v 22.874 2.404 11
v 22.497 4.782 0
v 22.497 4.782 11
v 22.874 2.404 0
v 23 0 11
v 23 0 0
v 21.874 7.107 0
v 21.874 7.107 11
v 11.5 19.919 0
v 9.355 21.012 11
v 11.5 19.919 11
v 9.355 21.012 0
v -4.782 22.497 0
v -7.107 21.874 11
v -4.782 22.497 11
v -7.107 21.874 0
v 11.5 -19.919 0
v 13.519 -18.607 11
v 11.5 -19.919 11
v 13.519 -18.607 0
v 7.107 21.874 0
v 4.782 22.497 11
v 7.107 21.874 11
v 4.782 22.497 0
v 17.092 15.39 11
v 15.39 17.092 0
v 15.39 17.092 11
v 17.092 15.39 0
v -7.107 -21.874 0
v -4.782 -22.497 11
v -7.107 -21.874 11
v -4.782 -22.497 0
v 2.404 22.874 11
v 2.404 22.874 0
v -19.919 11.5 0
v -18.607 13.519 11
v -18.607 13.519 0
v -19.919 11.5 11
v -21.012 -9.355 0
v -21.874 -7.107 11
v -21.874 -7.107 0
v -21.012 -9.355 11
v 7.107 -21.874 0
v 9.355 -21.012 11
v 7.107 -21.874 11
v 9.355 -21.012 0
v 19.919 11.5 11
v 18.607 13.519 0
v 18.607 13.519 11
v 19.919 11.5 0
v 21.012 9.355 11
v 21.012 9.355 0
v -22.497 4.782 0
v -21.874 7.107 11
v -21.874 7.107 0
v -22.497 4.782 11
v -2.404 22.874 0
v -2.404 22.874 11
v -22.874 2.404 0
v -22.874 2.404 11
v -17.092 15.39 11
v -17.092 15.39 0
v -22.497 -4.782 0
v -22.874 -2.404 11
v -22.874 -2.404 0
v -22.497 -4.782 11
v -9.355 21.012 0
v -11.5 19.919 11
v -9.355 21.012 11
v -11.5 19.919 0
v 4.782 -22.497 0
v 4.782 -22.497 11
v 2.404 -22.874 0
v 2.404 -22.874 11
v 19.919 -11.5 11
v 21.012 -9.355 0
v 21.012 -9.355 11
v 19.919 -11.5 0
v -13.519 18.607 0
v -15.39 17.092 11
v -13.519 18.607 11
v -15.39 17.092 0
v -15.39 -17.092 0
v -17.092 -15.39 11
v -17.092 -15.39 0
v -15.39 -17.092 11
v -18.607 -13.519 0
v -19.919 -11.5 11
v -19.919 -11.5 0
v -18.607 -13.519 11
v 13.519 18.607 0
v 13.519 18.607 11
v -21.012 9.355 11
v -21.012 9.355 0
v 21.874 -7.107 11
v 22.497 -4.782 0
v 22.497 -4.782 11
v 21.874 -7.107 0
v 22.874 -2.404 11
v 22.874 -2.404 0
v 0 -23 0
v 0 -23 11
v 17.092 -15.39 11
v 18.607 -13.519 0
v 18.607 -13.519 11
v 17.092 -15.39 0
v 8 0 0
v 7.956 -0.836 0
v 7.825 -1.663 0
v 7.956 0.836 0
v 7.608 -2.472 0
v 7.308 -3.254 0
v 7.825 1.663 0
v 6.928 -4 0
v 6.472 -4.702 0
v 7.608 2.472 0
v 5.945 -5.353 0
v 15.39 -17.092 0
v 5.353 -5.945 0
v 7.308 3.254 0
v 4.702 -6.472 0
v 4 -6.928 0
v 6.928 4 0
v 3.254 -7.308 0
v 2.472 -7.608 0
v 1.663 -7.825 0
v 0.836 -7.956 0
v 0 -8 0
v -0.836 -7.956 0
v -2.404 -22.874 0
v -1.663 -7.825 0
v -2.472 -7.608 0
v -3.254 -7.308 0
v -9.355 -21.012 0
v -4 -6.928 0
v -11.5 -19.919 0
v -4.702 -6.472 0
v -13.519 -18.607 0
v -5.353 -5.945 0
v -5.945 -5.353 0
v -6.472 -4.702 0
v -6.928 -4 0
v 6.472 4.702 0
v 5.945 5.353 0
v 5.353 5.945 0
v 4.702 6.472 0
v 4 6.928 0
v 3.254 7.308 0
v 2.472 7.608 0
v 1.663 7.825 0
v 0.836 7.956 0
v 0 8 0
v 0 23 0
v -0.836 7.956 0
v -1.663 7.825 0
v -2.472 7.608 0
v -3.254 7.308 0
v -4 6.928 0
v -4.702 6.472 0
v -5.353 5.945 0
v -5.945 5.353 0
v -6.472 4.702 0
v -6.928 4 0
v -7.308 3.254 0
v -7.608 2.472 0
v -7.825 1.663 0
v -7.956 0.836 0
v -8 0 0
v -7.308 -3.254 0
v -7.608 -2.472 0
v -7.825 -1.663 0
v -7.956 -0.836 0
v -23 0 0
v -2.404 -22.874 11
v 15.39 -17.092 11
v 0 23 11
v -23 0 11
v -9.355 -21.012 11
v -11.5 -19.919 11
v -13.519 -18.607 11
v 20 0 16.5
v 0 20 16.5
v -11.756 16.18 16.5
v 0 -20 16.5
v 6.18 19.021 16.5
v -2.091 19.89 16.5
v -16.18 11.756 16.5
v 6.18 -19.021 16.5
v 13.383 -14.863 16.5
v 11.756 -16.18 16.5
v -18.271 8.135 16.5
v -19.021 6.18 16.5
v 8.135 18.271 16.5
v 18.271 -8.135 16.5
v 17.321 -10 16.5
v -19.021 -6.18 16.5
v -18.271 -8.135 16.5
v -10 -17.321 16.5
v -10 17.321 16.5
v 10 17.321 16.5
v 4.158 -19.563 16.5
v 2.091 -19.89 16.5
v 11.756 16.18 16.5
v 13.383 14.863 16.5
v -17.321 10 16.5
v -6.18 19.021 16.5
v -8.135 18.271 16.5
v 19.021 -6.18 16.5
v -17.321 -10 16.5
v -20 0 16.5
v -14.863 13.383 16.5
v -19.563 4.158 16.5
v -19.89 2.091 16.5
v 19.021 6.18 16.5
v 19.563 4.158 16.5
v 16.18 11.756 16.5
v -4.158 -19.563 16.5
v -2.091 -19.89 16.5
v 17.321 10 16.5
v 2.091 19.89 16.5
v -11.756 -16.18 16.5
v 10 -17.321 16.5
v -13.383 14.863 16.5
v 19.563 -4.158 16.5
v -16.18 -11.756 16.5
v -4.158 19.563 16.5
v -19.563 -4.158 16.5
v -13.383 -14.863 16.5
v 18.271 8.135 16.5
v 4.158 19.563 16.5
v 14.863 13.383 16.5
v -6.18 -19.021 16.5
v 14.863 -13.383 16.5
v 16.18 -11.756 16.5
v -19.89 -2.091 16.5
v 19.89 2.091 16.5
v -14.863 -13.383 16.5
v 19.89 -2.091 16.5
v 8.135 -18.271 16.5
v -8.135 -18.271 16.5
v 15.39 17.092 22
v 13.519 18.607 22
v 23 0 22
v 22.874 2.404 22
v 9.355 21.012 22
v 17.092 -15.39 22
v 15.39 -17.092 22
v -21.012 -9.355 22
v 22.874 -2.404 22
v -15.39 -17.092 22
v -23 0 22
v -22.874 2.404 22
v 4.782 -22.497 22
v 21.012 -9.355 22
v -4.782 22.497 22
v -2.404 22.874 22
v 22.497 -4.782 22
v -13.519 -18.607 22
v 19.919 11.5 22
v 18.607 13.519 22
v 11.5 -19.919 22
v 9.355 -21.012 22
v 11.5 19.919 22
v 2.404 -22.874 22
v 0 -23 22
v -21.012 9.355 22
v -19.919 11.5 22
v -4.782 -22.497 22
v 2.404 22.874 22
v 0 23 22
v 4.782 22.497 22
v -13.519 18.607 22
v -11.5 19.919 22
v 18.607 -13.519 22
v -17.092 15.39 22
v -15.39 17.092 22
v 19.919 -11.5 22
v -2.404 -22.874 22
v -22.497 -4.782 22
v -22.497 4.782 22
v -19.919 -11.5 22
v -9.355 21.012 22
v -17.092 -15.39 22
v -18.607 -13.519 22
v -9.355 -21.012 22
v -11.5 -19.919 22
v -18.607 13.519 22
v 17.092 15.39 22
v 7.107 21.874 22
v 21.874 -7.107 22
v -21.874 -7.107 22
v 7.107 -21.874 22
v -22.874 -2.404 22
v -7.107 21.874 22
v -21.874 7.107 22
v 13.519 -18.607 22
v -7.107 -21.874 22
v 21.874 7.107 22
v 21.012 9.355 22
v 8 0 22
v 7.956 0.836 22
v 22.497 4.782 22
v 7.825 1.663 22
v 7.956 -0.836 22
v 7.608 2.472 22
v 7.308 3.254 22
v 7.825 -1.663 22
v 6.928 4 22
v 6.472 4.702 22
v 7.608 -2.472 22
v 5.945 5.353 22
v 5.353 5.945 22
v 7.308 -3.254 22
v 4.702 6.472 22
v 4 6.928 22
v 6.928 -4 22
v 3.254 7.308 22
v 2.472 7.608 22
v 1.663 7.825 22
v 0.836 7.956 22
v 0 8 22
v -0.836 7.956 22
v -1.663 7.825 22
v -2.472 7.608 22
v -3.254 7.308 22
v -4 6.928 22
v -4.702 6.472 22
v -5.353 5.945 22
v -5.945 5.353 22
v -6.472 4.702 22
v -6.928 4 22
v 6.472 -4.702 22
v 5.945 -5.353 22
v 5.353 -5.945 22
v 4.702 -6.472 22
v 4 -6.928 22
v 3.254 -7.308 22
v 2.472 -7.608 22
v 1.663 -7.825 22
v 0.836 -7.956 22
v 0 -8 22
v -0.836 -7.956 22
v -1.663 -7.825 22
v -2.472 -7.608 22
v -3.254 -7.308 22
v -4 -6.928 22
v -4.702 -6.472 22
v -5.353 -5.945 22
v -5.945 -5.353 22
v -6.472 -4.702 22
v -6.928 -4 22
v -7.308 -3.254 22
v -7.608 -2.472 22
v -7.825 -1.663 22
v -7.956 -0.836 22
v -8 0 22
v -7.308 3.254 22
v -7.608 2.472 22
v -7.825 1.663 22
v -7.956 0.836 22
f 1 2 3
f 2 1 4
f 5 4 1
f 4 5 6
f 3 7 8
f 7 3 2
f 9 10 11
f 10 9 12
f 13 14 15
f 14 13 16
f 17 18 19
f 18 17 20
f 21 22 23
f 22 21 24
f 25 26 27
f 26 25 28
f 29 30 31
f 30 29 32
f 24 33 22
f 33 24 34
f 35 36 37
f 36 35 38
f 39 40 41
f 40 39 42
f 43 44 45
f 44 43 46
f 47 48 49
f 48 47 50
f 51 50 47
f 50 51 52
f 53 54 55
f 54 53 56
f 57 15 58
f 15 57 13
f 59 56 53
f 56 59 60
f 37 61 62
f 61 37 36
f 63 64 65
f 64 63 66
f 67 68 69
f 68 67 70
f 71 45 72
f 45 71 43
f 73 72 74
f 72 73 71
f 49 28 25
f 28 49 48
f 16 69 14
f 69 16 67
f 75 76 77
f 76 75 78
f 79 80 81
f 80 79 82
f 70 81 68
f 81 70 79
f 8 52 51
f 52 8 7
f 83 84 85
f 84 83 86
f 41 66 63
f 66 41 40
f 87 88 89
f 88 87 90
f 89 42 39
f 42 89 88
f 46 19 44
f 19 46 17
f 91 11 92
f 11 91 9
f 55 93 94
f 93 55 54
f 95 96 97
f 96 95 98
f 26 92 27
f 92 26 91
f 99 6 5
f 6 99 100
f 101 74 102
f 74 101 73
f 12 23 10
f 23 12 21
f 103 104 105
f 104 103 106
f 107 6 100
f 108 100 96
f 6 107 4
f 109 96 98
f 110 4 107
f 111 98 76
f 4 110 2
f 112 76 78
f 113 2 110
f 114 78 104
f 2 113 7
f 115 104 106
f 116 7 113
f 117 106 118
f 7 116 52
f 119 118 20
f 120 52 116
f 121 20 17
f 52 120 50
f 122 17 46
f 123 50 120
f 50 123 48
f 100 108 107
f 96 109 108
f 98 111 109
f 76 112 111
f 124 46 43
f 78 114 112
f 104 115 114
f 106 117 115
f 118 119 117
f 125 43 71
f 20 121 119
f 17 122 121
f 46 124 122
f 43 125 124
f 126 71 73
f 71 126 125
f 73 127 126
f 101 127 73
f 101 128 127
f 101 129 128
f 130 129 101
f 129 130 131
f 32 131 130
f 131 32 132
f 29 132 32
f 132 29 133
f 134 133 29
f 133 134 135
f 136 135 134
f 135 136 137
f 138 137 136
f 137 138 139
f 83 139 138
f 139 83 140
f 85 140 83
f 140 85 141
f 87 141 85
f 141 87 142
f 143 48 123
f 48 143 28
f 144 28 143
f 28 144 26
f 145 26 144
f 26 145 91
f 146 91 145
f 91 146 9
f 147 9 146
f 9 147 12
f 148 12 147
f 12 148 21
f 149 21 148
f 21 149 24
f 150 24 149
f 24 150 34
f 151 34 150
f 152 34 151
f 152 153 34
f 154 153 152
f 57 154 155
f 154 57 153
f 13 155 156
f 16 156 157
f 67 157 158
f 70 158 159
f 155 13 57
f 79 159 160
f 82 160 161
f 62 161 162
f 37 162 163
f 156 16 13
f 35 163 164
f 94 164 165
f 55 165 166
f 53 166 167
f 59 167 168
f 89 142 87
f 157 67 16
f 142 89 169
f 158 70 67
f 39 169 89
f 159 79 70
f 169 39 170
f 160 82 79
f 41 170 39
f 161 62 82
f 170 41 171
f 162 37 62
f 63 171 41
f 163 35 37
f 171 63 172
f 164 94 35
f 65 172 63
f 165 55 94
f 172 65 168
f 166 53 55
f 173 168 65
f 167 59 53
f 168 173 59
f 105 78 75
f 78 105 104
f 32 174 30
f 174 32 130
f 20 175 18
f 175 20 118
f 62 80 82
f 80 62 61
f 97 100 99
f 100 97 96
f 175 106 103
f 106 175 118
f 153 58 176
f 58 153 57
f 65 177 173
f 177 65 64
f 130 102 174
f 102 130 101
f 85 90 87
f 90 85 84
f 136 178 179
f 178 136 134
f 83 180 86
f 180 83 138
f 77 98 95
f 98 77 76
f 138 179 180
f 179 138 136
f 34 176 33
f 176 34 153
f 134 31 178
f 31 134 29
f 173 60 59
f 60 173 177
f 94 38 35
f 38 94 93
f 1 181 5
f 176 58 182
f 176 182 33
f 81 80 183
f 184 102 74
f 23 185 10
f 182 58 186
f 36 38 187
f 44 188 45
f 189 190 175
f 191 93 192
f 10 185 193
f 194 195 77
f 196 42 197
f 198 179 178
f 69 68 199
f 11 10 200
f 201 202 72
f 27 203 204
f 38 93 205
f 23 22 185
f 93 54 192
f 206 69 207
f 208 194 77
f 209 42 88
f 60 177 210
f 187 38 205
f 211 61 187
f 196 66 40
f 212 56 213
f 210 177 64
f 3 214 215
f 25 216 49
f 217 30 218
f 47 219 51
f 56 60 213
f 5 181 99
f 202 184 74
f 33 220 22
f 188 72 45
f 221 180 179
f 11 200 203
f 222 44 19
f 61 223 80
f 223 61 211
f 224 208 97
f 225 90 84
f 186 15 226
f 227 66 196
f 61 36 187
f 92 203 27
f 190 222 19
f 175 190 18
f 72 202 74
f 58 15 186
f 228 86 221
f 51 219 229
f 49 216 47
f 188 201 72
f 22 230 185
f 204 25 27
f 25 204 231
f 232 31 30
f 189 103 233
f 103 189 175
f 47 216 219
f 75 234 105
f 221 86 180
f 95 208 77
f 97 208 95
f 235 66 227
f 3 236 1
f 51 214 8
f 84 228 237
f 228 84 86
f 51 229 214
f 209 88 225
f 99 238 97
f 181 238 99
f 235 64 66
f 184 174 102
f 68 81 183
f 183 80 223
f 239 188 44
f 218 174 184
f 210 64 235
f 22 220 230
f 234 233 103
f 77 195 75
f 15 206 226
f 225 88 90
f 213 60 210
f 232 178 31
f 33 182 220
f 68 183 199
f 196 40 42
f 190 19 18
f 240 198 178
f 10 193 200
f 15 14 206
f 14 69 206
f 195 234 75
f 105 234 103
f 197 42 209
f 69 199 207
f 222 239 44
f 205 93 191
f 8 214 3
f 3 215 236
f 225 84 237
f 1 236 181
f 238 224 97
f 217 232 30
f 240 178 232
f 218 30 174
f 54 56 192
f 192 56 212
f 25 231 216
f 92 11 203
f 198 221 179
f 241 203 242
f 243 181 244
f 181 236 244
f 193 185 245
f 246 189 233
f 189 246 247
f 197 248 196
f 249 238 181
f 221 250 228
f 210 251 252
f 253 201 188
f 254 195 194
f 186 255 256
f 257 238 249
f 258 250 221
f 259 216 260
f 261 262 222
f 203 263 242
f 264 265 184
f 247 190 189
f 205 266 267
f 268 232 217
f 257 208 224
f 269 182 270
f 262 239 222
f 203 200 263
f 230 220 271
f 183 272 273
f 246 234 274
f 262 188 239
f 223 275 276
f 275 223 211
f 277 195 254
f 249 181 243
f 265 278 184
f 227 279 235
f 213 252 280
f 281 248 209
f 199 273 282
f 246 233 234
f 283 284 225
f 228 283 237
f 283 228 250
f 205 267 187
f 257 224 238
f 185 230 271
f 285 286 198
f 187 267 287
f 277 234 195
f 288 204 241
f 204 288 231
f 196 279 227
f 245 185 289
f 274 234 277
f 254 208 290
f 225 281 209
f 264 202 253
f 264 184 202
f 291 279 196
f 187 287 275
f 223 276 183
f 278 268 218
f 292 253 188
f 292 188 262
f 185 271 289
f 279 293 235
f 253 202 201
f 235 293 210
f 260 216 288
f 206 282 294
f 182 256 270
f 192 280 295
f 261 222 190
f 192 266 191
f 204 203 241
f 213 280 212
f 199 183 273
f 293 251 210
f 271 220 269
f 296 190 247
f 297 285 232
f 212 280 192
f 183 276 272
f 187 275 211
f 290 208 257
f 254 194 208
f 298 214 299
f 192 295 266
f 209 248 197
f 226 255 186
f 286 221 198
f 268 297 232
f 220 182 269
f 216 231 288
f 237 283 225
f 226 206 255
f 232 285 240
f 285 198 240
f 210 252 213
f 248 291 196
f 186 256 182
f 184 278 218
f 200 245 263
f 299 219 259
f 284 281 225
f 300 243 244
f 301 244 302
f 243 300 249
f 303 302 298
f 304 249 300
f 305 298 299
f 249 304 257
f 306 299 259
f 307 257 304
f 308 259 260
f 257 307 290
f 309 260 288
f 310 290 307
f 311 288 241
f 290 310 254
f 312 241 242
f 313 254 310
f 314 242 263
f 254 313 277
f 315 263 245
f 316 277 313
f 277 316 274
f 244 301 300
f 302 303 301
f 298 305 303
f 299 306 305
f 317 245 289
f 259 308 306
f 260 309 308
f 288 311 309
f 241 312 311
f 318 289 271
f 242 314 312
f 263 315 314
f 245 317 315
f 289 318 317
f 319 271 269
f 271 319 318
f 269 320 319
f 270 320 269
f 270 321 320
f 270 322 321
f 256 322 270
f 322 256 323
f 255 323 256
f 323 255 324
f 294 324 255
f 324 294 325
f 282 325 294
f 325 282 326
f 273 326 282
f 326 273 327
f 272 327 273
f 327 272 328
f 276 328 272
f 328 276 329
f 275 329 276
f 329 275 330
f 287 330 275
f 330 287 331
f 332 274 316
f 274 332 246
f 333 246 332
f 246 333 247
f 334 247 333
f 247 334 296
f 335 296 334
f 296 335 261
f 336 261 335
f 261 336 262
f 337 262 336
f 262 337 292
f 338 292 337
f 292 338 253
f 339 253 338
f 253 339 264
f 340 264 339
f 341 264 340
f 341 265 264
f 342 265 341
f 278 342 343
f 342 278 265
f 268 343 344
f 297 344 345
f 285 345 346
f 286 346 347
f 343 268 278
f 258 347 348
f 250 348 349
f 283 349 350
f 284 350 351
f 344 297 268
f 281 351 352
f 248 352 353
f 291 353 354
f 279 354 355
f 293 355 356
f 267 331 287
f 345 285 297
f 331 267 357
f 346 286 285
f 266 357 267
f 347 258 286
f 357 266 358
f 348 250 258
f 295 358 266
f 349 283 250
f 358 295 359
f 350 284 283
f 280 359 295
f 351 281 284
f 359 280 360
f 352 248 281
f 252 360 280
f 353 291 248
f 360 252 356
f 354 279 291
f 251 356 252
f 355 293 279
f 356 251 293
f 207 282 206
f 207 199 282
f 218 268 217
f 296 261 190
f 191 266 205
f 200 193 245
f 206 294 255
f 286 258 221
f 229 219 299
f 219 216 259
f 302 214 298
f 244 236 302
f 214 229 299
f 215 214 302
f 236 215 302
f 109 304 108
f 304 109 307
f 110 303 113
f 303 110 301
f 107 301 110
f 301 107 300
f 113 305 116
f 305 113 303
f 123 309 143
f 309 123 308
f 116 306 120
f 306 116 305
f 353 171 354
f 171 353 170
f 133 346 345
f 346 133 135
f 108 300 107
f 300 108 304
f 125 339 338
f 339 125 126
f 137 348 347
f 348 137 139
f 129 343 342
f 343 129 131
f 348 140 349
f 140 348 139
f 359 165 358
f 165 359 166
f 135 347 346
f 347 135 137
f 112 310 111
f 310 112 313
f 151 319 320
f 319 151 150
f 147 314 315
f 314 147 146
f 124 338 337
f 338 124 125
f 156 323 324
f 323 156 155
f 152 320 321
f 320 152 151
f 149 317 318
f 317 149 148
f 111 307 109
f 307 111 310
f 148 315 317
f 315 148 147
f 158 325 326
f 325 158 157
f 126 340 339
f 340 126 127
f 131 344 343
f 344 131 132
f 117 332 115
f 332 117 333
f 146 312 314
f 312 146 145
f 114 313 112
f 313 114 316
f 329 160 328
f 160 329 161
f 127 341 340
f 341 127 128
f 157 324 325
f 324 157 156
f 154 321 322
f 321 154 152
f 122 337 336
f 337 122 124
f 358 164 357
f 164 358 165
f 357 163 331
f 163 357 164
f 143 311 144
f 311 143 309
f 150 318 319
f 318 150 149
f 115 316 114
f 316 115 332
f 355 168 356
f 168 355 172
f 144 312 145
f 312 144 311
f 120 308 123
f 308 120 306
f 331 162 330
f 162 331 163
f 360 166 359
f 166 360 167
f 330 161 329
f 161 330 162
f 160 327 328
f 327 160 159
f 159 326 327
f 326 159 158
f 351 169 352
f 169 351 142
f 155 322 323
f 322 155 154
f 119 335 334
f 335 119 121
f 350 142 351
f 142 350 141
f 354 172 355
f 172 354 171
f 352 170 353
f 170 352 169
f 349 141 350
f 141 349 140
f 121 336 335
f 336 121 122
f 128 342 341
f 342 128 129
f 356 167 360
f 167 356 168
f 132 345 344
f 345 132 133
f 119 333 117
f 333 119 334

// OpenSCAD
// V-groove guide wheel.
$fn = 60;
eps = 0.02;
bore_d = 16;
outer_d = 46;
width = 22;
groove_d = outer_d-6;
difference() {
    union() { cylinder(d=outer_d,h=width/2); translate([0,0,width/2]) cylinder(d1=outer_d,d2=groove_d,h=width/4); translate([0,0,3*width/4]) cylinder(d1=groove_d,d2=outer_d,h=width/4); }
    translate([0,0,-eps]) cylinder(d=bore_d,h=width+2*eps);
}
